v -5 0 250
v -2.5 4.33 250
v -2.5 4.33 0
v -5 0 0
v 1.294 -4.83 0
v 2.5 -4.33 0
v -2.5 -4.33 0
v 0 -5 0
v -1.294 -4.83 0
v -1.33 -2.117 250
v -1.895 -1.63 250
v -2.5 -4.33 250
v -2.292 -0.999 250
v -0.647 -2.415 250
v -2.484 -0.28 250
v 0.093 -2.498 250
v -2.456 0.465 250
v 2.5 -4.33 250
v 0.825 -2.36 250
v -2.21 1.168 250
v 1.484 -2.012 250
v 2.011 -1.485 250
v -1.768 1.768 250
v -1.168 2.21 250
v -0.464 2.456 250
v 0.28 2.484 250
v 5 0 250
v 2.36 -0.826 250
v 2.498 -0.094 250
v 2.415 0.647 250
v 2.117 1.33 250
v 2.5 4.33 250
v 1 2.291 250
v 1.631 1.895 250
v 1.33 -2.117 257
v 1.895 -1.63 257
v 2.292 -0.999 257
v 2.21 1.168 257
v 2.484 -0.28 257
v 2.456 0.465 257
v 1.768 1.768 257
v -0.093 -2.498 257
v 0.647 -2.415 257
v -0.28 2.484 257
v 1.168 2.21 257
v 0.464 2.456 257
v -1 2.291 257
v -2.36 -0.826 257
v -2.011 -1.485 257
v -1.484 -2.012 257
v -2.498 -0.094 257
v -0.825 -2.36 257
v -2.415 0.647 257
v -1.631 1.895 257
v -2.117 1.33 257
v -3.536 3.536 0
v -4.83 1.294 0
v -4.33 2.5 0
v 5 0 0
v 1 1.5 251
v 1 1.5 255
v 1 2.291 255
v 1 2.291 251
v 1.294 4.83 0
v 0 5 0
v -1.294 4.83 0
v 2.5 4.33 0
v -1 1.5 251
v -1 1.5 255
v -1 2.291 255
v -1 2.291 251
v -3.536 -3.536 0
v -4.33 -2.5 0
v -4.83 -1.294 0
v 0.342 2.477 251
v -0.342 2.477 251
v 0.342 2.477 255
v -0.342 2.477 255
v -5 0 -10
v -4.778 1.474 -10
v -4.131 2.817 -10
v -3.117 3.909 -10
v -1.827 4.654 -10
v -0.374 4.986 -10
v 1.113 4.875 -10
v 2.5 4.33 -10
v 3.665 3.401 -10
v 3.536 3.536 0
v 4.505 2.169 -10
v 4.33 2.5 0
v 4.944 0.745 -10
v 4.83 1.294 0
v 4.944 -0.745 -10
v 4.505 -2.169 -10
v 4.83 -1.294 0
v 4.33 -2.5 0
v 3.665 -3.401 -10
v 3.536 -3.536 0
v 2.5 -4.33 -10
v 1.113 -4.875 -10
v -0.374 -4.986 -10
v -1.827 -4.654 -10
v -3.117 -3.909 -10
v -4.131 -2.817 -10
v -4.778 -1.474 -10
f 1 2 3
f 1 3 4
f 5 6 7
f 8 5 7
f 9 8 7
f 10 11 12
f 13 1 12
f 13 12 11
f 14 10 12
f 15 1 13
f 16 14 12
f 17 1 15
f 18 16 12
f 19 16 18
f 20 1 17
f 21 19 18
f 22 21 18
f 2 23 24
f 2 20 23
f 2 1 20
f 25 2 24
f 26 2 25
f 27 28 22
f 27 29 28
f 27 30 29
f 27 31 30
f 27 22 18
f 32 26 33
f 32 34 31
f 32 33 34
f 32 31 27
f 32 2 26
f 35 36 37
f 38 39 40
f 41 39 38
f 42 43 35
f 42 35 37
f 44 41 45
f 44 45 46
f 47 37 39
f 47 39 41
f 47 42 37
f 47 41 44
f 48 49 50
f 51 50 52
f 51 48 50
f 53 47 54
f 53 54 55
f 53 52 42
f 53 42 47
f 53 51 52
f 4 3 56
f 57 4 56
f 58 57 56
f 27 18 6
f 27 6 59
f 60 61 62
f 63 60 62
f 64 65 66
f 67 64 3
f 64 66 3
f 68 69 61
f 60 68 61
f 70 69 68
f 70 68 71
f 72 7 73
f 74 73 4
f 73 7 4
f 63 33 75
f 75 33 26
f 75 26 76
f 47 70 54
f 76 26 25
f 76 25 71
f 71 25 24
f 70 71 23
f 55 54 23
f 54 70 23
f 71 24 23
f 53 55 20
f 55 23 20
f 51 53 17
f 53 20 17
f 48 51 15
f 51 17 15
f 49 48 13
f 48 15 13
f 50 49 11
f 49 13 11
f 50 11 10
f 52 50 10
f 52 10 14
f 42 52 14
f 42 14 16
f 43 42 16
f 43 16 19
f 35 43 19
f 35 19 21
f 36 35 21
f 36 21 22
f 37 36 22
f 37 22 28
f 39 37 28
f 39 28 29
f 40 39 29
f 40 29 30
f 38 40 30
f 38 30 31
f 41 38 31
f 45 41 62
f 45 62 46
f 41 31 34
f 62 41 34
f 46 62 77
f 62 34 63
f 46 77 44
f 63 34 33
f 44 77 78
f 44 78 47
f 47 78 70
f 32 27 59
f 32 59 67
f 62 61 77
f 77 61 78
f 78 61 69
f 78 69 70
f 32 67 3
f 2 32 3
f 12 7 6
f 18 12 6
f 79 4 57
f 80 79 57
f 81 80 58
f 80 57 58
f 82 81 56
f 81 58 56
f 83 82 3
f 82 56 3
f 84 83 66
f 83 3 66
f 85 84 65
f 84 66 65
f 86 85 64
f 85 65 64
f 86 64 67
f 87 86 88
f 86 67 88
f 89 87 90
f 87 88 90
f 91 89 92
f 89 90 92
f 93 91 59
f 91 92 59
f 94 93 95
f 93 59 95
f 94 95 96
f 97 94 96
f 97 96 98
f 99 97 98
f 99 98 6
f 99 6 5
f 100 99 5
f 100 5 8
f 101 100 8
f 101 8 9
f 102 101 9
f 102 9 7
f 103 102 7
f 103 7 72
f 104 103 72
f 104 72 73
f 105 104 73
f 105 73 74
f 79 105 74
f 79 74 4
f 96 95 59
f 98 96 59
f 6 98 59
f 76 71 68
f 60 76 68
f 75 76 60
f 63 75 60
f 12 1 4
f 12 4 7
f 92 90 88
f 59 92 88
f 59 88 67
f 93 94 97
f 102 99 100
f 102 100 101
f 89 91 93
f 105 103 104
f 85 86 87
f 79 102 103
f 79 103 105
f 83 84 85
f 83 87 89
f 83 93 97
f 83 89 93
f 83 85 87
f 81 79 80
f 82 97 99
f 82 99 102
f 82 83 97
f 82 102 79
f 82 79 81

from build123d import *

# Parameters (mm, degrees)
EXTRUDE_1_DEPTH     = 250
SKETCH_2_R          = 2.5
EXTRUDE_2_DEPTH     = 10
SKETCH_3_R          = 5
EXTRUDE_3_DEPTH     = 10
SKETCH_4_W          = 2
SKETCH_4_H          = 1.835573614
CUT_EXTRUDE_1_DEPTH = 10
EXTRUDE_START       = -5
SKETCH_6_R          = 2.5
EXTRUDE_5_DEPTH     = 5
SKETCH_9_R          = 2.5
EXTRUDE_7_DEPTH     = 5
SKETCH_10_R         = 2.5
CUT_EXTRUDE_3_DEPTH = 3
CUT_EXTRUDE_START   = -3
SKETCH_11_R         = 2.5
CUT_EXTRUDE_4_DEPTH = 3
EXTRUDE_START_2     = -10
SKETCH_12_R         = 5
EXTRUDE_8_DEPTH     = 10
SKETCH_14_R         = 2.5
EXTRUDE_10_DEPTH    = 1


with BuildPart() as part:
    # 草图1 → 凸台-拉伸1 (new body)
    with BuildSketch(Plane.XY):
        Polygon((5, 0), (2.5, 4.330127019), (-2.5, 4.330127019), (-5, 0), (-2.5, -4.330127019), (2.5, -4.330127019), align=None)
    extrude(amount=EXTRUDE_1_DEPTH)

    # 草图2 → 凸台-拉伸2 (add)
    with BuildSketch(Plane.XY.offset(250)):
        Circle(SKETCH_2_R)
    extrude(amount=EXTRUDE_2_DEPTH)

    # 草图3 → 凸台-拉伸3 (add)
    with BuildSketch(Plane(origin=(0, 0, 0), x_dir=(-1, 0, 0), z_dir=(0, 0, -1))):
        Circle(SKETCH_3_R)
    extrude(amount=EXTRUDE_3_DEPTH)

    # 草图4 → 切除-拉伸1 (cut)
    with BuildSketch(Plane.XY.offset(260)):
        with Locations((0, 2.417786807)):
            Rectangle(SKETCH_4_W, SKETCH_4_H)
    extrude(amount=-CUT_EXTRUDE_1_DEPTH, mode=Mode.SUBTRACT)

    # 草图6 → 凸台-拉伸5 (add)
    with BuildSketch(Plane.XY.offset(260).offset(EXTRUDE_START)):
        with Locations(Location((0, 0, 0), (0, 0, 113.578178478))):
            Circle(SKETCH_6_R)
    extrude(amount=EXTRUDE_5_DEPTH)

    # 草图9 → 凸台-拉伸7 (add)
    with BuildSketch(Plane(origin=(0, 0, -10), x_dir=(-1, 0, 0), z_dir=(0, 0, -1))):
        with Locations(Location((0, 0, 0), (0, 0, 66.421821522))):
            Circle(SKETCH_9_R)
    extrude(amount=-EXTRUDE_7_DEPTH)

    # 草图10 → 切除-拉伸3 (cut)
    with BuildSketch(Plane(origin=(0, 0, -10), x_dir=(-1, 0, 0), z_dir=(0, 0, -1))):
        with Locations(Location((0, 0, 0), (0, 0, 66.421821522))):
            Circle(SKETCH_10_R)
    extrude(amount=-CUT_EXTRUDE_3_DEPTH, mode=Mode.SUBTRACT)

    # 草图11 → 切除-拉伸4 (cut)
    with BuildSketch(Plane.XY.offset(260).offset(CUT_EXTRUDE_START)):
        with Locations(Location((0, 0, 0), (0, 0, 113.578178478))):
            Circle(SKETCH_11_R)
    extrude(amount=CUT_EXTRUDE_4_DEPTH, mode=Mode.SUBTRACT)

    # 草图12 → 凸台-拉伸8 (add)
    with BuildSketch(Plane(origin=(0, 0, -10), x_dir=(-1, 0, 0), z_dir=(0, 0, -1)).offset(EXTRUDE_START_2)):
        Circle(SKETCH_12_R)
    extrude(amount=EXTRUDE_8_DEPTH)

    # 草图14 → 凸台-拉伸10 (add)
    with BuildSketch(Plane.XY.offset(250)):
        Circle(SKETCH_14_R)
    extrude(amount=EXTRUDE_10_DEPTH)


solid = part.part
